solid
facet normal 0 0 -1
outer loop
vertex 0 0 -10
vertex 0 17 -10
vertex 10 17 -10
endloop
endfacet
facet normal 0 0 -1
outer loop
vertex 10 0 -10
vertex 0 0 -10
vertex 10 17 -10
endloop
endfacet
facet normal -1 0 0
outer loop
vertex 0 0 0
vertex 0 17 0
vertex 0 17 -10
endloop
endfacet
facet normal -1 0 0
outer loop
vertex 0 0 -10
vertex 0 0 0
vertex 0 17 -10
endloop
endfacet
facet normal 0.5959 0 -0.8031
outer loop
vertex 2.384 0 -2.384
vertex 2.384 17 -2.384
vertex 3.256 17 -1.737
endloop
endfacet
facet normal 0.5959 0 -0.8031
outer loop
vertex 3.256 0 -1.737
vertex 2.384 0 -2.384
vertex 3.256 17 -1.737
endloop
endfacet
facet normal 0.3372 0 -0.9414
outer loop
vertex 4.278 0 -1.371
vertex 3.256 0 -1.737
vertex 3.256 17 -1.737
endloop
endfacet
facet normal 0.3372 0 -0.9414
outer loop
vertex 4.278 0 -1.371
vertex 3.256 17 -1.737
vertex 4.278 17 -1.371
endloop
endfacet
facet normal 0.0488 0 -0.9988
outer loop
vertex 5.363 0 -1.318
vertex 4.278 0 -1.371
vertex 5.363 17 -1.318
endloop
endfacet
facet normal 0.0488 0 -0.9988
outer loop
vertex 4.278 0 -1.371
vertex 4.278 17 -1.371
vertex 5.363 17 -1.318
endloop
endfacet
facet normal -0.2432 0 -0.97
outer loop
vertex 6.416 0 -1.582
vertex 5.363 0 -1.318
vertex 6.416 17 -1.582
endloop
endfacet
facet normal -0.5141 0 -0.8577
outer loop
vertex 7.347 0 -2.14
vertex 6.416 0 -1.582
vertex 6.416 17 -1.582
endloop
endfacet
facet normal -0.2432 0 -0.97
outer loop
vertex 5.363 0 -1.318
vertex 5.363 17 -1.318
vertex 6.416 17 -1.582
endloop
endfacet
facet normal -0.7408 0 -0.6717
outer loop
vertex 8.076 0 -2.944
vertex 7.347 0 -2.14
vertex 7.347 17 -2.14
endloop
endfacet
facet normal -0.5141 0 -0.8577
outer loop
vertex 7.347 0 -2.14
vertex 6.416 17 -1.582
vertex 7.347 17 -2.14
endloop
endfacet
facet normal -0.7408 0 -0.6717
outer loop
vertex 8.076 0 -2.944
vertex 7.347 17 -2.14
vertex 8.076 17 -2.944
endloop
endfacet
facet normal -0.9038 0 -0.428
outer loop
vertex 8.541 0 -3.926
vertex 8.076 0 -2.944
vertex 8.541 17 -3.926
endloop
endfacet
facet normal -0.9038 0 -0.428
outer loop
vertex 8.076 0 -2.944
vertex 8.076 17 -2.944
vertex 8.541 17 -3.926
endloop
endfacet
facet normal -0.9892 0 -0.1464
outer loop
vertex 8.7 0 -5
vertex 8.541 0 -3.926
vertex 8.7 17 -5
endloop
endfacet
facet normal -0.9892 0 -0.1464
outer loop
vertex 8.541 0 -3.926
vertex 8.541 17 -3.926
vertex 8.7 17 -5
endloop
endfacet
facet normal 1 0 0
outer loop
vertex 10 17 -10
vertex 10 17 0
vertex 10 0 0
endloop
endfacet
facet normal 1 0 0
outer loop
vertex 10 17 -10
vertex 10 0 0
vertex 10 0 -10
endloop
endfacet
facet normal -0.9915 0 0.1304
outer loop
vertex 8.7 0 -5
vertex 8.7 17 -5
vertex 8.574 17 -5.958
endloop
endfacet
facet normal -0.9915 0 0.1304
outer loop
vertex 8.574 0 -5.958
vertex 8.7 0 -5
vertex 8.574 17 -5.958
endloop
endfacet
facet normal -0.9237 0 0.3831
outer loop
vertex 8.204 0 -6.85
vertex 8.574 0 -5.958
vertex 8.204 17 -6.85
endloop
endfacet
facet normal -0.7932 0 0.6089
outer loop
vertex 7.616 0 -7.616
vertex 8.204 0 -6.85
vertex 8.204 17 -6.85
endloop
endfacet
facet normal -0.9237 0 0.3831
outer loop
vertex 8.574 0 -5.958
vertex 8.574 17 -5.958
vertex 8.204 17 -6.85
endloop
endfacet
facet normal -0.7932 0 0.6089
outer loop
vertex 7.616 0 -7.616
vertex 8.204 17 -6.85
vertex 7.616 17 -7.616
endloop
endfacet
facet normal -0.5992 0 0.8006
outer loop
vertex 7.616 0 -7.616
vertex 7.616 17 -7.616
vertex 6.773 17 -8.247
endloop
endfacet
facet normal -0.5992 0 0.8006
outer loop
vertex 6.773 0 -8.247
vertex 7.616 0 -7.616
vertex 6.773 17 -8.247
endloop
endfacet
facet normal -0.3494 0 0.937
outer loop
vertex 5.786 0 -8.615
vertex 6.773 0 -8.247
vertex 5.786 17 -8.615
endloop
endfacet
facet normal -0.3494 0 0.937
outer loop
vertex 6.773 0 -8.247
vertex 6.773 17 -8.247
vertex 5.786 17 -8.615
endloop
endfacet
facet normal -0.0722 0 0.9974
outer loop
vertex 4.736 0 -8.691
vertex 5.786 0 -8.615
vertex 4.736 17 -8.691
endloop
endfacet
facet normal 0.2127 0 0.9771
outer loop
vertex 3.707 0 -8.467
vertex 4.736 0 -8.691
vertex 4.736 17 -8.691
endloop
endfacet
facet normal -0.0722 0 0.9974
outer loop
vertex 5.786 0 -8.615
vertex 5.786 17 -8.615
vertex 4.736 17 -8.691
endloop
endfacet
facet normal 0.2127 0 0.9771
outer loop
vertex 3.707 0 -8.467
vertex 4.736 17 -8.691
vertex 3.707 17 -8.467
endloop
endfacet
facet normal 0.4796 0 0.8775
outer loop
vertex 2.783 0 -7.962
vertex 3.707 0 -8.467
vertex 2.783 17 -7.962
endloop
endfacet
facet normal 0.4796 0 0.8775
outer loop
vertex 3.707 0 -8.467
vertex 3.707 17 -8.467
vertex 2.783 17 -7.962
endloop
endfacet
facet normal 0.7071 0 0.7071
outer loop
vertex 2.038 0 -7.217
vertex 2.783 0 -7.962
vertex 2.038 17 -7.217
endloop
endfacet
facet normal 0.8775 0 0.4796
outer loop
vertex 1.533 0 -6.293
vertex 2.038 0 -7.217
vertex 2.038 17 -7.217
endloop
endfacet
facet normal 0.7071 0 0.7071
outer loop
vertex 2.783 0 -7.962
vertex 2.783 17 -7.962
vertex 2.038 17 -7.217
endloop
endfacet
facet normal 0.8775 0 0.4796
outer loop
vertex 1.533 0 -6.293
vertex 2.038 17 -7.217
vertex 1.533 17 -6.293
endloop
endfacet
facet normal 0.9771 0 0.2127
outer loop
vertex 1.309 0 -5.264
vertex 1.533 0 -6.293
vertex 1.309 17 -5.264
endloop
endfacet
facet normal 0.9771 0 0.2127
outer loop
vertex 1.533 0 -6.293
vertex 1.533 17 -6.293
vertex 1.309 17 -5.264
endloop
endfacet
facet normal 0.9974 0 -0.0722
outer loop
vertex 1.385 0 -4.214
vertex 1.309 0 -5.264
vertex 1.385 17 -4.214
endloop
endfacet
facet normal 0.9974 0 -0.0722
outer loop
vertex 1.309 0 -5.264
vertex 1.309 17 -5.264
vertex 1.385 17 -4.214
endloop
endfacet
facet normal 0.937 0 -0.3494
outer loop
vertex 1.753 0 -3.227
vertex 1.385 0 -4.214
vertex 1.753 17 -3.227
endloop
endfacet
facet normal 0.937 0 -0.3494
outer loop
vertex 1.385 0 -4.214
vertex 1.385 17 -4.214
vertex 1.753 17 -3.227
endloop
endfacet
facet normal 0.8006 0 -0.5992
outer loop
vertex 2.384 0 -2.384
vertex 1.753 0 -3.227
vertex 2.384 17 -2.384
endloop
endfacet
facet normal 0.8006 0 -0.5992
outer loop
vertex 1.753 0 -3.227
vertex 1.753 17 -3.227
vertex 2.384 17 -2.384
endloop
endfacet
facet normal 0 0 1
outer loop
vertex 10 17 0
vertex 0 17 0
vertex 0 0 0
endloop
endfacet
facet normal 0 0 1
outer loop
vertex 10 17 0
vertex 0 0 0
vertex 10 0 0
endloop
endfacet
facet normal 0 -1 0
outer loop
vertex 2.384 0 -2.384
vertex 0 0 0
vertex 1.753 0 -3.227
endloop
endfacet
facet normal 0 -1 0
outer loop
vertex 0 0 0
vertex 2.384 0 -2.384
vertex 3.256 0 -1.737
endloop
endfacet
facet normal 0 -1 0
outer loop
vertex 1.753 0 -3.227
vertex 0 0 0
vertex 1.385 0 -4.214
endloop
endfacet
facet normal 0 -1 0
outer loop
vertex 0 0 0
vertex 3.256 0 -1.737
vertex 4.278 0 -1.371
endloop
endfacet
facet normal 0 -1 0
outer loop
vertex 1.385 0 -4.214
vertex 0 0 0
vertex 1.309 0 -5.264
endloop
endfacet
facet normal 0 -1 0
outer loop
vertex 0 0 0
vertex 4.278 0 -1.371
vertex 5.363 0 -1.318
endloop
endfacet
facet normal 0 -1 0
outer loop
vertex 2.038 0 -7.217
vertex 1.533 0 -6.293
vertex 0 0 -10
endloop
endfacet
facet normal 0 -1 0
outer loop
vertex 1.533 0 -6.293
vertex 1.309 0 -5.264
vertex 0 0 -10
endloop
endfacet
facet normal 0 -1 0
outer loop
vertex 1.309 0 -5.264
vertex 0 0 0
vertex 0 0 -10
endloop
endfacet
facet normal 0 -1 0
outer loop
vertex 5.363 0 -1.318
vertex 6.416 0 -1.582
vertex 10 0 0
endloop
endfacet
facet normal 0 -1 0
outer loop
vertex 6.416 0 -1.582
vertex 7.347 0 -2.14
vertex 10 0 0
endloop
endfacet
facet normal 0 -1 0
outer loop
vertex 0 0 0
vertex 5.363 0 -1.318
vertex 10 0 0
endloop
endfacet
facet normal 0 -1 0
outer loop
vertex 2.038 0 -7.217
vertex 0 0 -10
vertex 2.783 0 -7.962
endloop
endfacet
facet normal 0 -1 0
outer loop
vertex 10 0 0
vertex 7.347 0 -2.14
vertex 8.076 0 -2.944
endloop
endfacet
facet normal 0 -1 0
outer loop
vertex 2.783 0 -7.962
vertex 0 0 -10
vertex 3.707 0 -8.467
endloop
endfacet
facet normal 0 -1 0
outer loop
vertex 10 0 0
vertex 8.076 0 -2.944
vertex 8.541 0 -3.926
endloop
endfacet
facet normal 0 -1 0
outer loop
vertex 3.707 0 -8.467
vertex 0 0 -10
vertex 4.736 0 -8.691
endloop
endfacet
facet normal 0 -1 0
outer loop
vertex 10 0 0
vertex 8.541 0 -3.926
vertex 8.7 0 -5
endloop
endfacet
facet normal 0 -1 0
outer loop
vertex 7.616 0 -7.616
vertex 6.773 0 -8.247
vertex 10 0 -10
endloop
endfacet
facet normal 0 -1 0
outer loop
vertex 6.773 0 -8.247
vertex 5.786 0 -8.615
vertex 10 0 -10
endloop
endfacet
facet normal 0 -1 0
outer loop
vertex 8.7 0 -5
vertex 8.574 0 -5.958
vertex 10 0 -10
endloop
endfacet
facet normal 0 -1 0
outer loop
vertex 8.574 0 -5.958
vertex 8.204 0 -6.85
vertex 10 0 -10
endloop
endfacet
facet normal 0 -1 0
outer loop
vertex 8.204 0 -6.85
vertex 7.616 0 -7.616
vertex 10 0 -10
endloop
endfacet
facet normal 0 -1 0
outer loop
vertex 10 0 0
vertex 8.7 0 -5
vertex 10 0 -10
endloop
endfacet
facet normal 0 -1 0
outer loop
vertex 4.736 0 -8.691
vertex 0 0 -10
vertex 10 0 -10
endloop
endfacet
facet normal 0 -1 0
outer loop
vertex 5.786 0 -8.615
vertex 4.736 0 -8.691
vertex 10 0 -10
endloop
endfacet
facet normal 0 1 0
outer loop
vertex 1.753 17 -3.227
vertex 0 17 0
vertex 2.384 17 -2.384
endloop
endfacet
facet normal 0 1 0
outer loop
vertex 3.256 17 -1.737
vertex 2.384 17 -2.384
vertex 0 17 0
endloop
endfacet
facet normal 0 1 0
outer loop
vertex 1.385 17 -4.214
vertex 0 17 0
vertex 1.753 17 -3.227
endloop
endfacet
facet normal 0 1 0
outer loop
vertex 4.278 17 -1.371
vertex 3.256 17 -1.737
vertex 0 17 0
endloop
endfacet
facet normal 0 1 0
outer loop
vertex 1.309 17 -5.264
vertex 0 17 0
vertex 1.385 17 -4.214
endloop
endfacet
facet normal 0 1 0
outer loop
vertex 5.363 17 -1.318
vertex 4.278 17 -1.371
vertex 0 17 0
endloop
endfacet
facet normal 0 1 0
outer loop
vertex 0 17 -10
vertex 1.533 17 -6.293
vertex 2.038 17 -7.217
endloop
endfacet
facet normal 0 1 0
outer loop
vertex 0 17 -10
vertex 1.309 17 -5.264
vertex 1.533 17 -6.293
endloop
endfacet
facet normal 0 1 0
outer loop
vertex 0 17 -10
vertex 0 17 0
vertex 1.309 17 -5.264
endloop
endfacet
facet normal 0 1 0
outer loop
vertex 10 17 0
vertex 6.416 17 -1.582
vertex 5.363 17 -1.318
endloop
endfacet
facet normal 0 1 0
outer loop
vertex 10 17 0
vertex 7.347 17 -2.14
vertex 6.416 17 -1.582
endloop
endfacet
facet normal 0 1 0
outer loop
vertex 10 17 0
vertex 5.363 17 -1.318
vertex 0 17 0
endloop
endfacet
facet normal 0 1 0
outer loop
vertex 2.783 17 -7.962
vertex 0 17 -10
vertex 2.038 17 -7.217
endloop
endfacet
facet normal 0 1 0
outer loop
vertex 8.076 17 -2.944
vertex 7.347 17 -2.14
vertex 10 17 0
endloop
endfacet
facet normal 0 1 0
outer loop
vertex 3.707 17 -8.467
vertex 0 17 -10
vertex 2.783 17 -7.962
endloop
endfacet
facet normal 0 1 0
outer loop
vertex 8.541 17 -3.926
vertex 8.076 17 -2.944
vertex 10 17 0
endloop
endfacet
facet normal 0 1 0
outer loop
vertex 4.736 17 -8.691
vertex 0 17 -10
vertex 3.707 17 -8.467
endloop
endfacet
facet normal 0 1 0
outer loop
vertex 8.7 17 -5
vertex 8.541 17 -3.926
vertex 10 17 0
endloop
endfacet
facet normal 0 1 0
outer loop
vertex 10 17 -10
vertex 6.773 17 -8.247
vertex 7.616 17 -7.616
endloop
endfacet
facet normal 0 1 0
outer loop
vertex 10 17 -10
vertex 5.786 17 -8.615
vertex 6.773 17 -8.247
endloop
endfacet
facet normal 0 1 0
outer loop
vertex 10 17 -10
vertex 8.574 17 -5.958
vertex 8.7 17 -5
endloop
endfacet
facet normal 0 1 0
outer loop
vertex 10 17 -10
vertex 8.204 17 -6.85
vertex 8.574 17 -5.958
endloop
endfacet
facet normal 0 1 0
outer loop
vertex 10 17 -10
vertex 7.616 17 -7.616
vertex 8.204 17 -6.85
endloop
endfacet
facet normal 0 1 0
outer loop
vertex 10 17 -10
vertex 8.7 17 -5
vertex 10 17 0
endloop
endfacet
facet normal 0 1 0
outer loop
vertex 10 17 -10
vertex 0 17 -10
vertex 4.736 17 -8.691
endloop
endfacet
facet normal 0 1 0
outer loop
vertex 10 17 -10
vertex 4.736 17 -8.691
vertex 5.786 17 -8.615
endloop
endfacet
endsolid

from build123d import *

# Parameters (mm, degrees)
SKETCH1_W           = 10
SKETCH1_H           = 10
BOSS_EXTRUDE1_DEPTH = 17
CUT_EXTRUDE1_DEPTH  = 17


with BuildPart() as part:
    # Sketch1 → Boss-Extrude1 (new body)
    with BuildSketch(Plane(origin=(0, 0, 0), x_dir=(1, 0, 0), z_dir=(0, 1, 0))):
        with Locations((5, 5)):
            Rectangle(SKETCH1_W, SKETCH1_H)
    extrude(amount=BOSS_EXTRUDE1_DEPTH)

    # Sketch2 → Cut-Extrude1 (cut)
    with BuildSketch(Plane(origin=(0, 17, 0), x_dir=(1, 0, 0), z_dir=(0, 1, 0))):
        with BuildLine():
            ThreePointArc((7.61629509, 7.61629509), (2.38370491, 7.61629509), (2.38370491, 2.38370491))
            Line((2.38370491, 2.38370491), (7.61629509, 7.61629509))
        make_face()
        with BuildLine():
            Line((7.61629509, 7.61629509), (2.38370491, 2.38370491))
            ThreePointArc((2.38370491, 2.38370491), (6.4159287, 1.58164573), (8.7, 5))
            ThreePointArc((8.7, 5), (8.41835427, 6.4159287), (7.61629509, 7.61629509))
        make_face()
    extrude(amount=-CUT_EXTRUDE1_DEPTH, mode=Mode.SUBTRACT)


solid = part.part
